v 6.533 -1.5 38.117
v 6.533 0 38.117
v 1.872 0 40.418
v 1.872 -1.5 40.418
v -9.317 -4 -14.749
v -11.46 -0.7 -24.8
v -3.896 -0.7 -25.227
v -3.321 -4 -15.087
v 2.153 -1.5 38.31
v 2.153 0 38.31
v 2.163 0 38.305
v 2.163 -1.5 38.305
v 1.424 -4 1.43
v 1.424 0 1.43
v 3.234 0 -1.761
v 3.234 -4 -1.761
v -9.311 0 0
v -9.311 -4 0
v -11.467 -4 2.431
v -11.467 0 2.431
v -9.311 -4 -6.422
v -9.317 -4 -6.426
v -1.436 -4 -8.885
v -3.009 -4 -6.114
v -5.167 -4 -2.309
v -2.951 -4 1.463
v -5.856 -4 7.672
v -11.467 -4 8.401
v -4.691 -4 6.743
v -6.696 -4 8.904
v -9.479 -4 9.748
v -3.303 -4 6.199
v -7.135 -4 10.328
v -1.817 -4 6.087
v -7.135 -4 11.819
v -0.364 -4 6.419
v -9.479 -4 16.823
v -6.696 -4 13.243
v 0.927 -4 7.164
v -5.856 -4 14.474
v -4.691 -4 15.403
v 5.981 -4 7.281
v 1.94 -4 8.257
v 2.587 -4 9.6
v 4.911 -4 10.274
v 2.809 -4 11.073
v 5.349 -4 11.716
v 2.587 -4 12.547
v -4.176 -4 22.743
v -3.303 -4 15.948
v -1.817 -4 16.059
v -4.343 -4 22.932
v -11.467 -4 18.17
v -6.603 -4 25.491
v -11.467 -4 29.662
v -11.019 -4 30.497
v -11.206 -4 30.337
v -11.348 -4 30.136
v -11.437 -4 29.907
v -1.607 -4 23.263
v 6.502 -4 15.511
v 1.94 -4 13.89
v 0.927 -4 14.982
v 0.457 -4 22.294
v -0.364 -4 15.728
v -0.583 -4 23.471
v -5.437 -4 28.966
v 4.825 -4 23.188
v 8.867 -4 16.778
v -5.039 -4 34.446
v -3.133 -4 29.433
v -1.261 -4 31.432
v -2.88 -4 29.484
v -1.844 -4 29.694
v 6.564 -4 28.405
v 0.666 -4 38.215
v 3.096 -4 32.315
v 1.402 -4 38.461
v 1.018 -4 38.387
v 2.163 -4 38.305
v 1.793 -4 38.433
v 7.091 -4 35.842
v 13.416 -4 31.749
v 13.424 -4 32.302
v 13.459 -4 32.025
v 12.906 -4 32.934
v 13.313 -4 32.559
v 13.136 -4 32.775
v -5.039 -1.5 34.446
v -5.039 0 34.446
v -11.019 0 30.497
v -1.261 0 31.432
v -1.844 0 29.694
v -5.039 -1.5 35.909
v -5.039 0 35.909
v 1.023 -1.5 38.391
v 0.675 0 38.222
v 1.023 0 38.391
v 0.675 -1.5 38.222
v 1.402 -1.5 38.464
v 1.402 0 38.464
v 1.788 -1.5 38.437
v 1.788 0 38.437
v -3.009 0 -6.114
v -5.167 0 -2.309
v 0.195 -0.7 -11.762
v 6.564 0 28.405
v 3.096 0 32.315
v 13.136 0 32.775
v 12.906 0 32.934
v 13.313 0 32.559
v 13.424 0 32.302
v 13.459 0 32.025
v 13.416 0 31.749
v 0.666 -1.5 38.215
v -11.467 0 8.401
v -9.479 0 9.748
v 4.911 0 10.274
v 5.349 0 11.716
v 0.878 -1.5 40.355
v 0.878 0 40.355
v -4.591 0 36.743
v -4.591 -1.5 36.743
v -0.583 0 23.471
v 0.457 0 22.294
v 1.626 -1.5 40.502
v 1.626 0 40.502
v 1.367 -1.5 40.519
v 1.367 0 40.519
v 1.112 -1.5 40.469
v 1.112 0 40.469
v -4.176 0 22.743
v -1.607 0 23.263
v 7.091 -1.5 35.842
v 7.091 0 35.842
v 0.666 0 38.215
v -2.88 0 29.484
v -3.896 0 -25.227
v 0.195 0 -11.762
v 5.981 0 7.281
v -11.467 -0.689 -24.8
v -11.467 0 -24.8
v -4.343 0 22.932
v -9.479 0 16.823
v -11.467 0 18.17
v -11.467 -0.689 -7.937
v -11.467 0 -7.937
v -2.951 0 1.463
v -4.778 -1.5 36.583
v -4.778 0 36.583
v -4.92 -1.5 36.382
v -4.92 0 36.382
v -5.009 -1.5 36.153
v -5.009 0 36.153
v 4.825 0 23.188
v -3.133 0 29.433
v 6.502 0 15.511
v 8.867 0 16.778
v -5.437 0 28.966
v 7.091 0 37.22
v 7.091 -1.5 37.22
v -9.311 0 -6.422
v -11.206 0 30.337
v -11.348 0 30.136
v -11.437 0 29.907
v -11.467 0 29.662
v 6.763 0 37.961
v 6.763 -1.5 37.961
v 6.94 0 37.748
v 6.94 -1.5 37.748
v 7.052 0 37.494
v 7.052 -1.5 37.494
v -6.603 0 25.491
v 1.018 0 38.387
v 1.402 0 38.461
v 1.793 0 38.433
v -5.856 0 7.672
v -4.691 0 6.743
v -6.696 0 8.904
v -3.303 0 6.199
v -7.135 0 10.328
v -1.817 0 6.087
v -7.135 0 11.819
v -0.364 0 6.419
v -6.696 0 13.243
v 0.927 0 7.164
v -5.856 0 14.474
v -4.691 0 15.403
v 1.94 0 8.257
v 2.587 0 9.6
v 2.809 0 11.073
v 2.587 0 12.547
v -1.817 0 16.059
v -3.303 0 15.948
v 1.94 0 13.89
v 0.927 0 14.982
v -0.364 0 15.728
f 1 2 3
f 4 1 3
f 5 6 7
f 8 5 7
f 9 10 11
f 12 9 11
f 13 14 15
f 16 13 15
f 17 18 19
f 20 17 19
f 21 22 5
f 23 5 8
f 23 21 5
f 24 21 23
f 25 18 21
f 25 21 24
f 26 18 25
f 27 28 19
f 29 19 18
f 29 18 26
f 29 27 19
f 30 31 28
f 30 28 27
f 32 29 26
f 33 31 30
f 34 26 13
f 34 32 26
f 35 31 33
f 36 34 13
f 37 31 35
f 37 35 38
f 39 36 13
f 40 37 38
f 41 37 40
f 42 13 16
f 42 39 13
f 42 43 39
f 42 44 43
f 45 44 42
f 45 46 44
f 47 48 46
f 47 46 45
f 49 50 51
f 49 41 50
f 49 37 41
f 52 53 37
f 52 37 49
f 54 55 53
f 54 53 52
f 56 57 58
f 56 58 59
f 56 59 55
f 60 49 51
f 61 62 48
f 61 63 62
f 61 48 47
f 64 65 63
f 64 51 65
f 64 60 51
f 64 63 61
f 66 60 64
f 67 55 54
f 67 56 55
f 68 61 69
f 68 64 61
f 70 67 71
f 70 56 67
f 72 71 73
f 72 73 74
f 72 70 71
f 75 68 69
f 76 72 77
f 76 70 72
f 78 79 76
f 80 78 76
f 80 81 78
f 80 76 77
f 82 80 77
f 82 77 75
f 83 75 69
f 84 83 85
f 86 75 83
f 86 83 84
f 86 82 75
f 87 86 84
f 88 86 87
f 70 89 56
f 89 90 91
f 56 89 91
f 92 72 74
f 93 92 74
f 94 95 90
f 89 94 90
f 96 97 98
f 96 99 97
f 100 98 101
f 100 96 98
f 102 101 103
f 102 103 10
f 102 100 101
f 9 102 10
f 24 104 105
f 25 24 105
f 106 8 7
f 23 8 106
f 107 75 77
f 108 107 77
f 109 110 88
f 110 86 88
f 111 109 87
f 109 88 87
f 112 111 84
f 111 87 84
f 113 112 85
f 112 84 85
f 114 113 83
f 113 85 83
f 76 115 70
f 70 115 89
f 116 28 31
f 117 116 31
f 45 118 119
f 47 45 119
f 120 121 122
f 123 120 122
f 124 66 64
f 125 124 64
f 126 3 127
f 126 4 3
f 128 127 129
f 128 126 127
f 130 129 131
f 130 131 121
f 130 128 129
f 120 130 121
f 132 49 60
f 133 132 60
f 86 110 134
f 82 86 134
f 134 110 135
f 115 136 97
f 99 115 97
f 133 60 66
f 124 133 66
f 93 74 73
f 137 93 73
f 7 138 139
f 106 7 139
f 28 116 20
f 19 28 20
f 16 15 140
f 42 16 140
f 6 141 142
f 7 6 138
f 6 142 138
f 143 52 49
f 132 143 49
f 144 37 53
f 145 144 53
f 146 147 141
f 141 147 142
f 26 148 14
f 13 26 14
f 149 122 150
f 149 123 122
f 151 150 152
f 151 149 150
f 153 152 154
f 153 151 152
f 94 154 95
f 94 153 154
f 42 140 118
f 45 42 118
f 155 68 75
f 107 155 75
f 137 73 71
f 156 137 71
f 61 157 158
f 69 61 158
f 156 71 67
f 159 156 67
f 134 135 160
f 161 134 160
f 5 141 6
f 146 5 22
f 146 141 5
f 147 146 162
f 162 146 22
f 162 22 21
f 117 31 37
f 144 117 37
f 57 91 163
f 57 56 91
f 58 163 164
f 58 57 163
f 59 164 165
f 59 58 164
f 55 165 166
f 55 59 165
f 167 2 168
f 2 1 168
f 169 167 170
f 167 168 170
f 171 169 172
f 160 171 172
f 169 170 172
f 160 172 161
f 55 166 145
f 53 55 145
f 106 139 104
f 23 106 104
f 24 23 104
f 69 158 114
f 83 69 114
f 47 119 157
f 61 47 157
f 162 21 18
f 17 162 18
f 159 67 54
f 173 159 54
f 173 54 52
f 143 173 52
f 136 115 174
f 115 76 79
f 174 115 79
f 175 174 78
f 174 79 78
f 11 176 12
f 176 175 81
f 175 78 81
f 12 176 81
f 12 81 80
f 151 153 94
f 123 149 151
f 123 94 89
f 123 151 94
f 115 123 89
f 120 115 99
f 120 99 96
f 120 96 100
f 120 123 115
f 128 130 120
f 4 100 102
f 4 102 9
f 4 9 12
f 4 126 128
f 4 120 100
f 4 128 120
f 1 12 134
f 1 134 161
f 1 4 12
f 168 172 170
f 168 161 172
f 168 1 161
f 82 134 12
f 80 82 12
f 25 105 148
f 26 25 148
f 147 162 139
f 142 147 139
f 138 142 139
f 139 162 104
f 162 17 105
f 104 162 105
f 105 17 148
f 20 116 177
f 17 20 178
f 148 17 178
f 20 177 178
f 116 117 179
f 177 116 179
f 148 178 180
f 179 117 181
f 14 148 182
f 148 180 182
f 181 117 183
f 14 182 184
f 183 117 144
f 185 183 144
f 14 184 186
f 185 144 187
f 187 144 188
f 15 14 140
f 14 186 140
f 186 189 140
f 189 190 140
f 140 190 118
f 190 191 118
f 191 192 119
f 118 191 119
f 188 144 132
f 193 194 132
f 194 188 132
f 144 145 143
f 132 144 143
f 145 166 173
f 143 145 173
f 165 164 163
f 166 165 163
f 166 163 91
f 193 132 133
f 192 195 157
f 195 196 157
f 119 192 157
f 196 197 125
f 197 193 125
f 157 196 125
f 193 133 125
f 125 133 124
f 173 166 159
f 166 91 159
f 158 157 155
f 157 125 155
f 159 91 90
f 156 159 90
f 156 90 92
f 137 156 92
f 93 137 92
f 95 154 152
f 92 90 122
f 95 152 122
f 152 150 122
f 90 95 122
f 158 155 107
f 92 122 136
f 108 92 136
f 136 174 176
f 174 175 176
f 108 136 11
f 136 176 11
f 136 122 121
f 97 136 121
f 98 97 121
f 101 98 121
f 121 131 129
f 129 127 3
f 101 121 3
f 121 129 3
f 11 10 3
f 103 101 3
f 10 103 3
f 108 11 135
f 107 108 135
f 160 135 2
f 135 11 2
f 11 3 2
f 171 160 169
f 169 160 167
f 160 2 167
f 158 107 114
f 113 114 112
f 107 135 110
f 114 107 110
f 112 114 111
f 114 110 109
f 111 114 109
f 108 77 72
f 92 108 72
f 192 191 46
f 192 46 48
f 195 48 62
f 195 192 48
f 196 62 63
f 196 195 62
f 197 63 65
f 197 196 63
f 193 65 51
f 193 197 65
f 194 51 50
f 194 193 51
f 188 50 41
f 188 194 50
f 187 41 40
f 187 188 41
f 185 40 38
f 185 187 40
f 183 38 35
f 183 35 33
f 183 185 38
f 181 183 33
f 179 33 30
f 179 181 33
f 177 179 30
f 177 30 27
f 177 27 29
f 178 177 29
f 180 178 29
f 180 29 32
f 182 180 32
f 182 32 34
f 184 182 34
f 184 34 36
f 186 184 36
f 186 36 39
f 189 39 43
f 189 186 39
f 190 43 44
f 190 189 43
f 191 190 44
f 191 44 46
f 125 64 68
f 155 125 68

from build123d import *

# Parameters (mm, degrees)
F0_R      = 5
F1_DEPTH  = 4
F3_R      = 1
F4_R      = 1.5
F5_DEPTH  = 1.5
F6_R      = 1.48
F7_R      = 1
F8_R      = 1
F9_DEPTH  = 4
F10_DEPTH = 4
F12_DEPTH = 25
F13_DEPTH = 25
F14_DEPTH = 25
F15_DEPTH = 25
F16_DEPTH = 25
F17_DEPTH = 25
F18_DEPTH = 25
F19_DEPTH = 25
F20_DEPTH = 25
F21_DEPTH = 25
F22_SIZE2 = 3.3107096722
F22_SIZE  = 2.15
F23_SIZE2 = 2.3975903424
F23_SIZE  = 3.3
F24_SIZE2 = 10.1563556727
F24_SIZE  = 3.3


with BuildPart() as f1:
    # F0 (on Front) → F1 (new body)
    with BuildSketch(Plane.XZ):
        Polygon((-5.0394813192, 34.4464560161), (-11.4673425455, 30.2002090896), (-11.4673425455, 14.3180689151), (-9.5205468137, 12.9544524784), (-9.5205468137, 5.9659214999), (-11.4673425455, 4.6023059945), (-11.4673425455, -3.5793893662), (-9.5205468137, -4.943005803), (-9.5205468137, -11.4201806177), (-11.4673425455, -12.7837961231), (-11.4673425455, -24.7997909104), (-3.8956315734, -25.2267909859), (0.1954483631, -11.7619743544), (-3.008507374, -6.1141202787), (-5.1672247355, -2.308786607), (-2.9510677868, 1.4633843035), (1.4238065236, 1.4302215424), (3.2341110933, -1.7609386613), (5.9812411675, 7.2805866294), (4.9106002387, 10.2737202031), (5.3487122304, 11.715661628), (6.5019388672, 15.5112328316), (8.8668211656, 16.7777869175), (13.660922366, 32.55643084), (7.090733743, 35.8415256189), (1.388379907, 38.6927029426), align=None)
        with Locations((-2.1907666232, 11.0733276233)):
            Circle(F0_R, mode=Mode.SUBTRACT)
    extrude(amount=F1_DEPTH)

    # F3
    f3_edges = [f1.edges().sort_by_distance(p)[0] for p in [
        (-11.467343, -2, 30.200209),
        (13.660922, -2, 32.556431),
    ]]
    fillet(f3_edges, radius=F3_R)

    # F4
    f4_edges = [f1.edges().sort_by_distance(p)[0] for p in [
        (1.38838, -2, 38.692703),
    ]]
    fillet(f4_edges, radius=F4_R)

    # F0 (on Front) → F5 (join)
    with BuildSketch(Plane.XZ):
        Polygon((-5.0394813192, 36.4464560161), (-5.0394813192, 34.4464560161), (1.388379907, 38.6927029426), (7.090733743, 35.8415256189), (7.090733743, 37.8415256189), (1.3569573109, 40.6719451668), align=None)
    extrude(amount=F5_DEPTH)

    # F6
    f6_edges = [f1.edges().sort_by_distance(p)[0] for p in [
        (1.38838, -0.75, 38.692703),
    ]]
    fillet(f6_edges, radius=F6_R)

    # F7
    f7_edges = [f1.edges().sort_by_distance(p)[0] for p in [
        (1.356957, -0.75, 40.671945),
    ]]
    fillet(f7_edges, radius=F7_R)

    # F8
    f8_edges = [f1.edges().sort_by_distance(p)[0] for p in [
        (7.090734, -0.75, 37.841526),
        (-5.039481, -0.75, 36.446456),
    ]]
    fillet(f8_edges, radius=F8_R)

    # F0 (on Front) → F9 (join)
    with BuildSketch(Plane.XZ):
        Polygon((-9.5205468137, 12.9544524784), (-11.4673425455, 14.3180689151), (-11.4673425455, 4.6023059945), (-9.5205468137, 5.9659214999), align=None)
    extrude(amount=F9_DEPTH)

    # F0 (on Front) → F10 (join)
    with BuildSketch(Plane.XZ):
        Polygon((-9.5205468137, -4.943005803), (-11.4673425455, -3.5793893662), (-11.4673425455, -12.7837961231), (-9.5205468137, -11.4201806177), align=None)
    extrude(amount=F10_DEPTH)

    # F11 (on face) → F12 (cut)
    with BuildSketch(Plane.XZ.offset(4)):
        Polygon((-11.4673425455, 18.1700624526), (-11.4673425455, 8.4008118138), (-9.4790116895, 9.7482940182), (-9.4790116895, 16.8225802481), align=None)
    extrude(amount=-F12_DEPTH, mode=Mode.SUBTRACT)

    # F11 (on face) → F13 (cut)
    with BuildSketch(Plane.XZ.offset(4)):
        Polygon((-11.4673425455, 2.4312612155), (-11.4673425455, -7.9374192283), (-9.3105754826, -6.4215008169), (-9.3105754826, 0), align=None)
    extrude(amount=-F13_DEPTH, mode=Mode.SUBTRACT)

    # F2 (on face) → F14 (cut)
    with BuildSketch(Plane.XZ.offset(4)):
        Polygon((4.8250659445, 23.1876130557), (6.5640832201, 28.4046710308), (3.0962773256, 32.3153540431), (-1.2611432737, 31.4323578126), (-1.8441430637, 29.694451147), (0.58299979, 26.9467592245), (-0.58299979, 23.4709458933), (0.456882035, 22.2937284557), align=None)
    extrude(amount=-F14_DEPTH, mode=Mode.SUBTRACT)

    # F2 (on face) → F15 (cut)
    with BuildSketch(Plane.XZ.offset(4)):
        Polygon((-4.3431362726, 22.9318731841), (-1.7787461332, 23.4566379151), (-4.2111435343, 26.1996793323), (-3.1332999575, 29.4332138733), (-5.4372854972, 28.9663297384), (-6.6032850771, 25.4905164073), align=None)
    extrude(amount=-F15_DEPTH, mode=Mode.SUBTRACT)

    # F2 (on face) → F16 (cut)
    with BuildSketch(Plane.XZ.offset(4)):
        Polygon((-3.0101426436, 26.2186378159), (-1.4476834802, 24.4498270447), (-0.6194012828, 26.9346765651), (-2.1796810883, 28.6942213364), align=None)
    extrude(amount=-F16_DEPTH, mode=Mode.SUBTRACT)

    # F2 (on face) → F17 (cut)
    with BuildSketch(Plane.XZ.offset(4)):
        Polygon((-1.7787461332, 23.4566379151), (-1.4476834802, 24.4498270447), (-3.0101426436, 26.2186378159), (-2.1796810883, 28.6942213364), (-2.8804242206, 29.4844571071), (-3.1332999575, 29.4332138733), (-4.2111435343, 26.1996793323), align=None)
    extrude(amount=-F17_DEPTH, mode=Mode.SUBTRACT)

    # F2 (on face) → F18 (cut)
    with BuildSketch(Plane.XZ.offset(4)):
        Polygon((-1.4476834802, 24.4498270447), (-0.58299979, 23.4709458933), (0.58299979, 26.9467592245), (-1.8441430637, 29.694451147), (-2.1796810883, 28.6942213364), (-0.6194012828, 26.9346765651), align=None)
    extrude(amount=-F18_DEPTH, mode=Mode.SUBTRACT)

    # F2 (on face) → F19 (cut)
    with BuildSketch(Plane.XZ.offset(4)):
        Polygon((-2.1796810883, 28.6942213364), (-1.8441430637, 29.694451147), (-2.8804242206, 29.4844571071), align=None)
    extrude(amount=-F19_DEPTH, mode=Mode.SUBTRACT)

    # F2 (on face) → F20 (cut)
    with BuildSketch(Plane.XZ.offset(4)):
        Polygon((-1.6073627495, 23.2633669802), (-0.58299979, 23.4709458933), (-1.4476834802, 24.4498270447), (-1.7787461332, 23.4566379151), align=None)
    extrude(amount=-F20_DEPTH, mode=Mode.SUBTRACT)

    # F2 (on face) → F21 (cut)
    with BuildSketch(Plane.XZ.offset(4)):
        Polygon((-4.1761422235, 22.7428244847), (-1.6073627495, 23.2633669802), (-1.7787461332, 23.4566379151), (-4.3431362726, 22.9318731841), align=None)
    extrude(amount=-F21_DEPTH, mode=Mode.SUBTRACT)

    # F22
    f22_edges = [f1.edges().sort_by_distance(p)[0] for p in [
        (-11.467343, -4, -16.368605),
    ]]
    chamfer(f22_edges, length=F22_SIZE, length2=F22_SIZE2)

    # F23
    f23_edges = [f1.edges().sort_by_distance(p)[0] for p in [
        (-1.850092, -4, -18.494383),
    ]]
    f23_side = f1.faces().sort_by_distance((-1.850092, -2, -18.494383))[0]
    chamfer(f23_edges, length=F23_SIZE, length2=F23_SIZE2, reference=f23_side)

    # F24
    f24_edges = [f1.edges().sort_by_distance(p)[0] for p in [
        (-7.838288, -4, -25.004448),
    ]]
    f24_side = f1.faces().sort_by_distance((-7.731254, -1.697794, -25.010484))[0]
    chamfer(f24_edges, length=F24_SIZE, length2=F24_SIZE2, reference=f24_side)


solid = f1.part
